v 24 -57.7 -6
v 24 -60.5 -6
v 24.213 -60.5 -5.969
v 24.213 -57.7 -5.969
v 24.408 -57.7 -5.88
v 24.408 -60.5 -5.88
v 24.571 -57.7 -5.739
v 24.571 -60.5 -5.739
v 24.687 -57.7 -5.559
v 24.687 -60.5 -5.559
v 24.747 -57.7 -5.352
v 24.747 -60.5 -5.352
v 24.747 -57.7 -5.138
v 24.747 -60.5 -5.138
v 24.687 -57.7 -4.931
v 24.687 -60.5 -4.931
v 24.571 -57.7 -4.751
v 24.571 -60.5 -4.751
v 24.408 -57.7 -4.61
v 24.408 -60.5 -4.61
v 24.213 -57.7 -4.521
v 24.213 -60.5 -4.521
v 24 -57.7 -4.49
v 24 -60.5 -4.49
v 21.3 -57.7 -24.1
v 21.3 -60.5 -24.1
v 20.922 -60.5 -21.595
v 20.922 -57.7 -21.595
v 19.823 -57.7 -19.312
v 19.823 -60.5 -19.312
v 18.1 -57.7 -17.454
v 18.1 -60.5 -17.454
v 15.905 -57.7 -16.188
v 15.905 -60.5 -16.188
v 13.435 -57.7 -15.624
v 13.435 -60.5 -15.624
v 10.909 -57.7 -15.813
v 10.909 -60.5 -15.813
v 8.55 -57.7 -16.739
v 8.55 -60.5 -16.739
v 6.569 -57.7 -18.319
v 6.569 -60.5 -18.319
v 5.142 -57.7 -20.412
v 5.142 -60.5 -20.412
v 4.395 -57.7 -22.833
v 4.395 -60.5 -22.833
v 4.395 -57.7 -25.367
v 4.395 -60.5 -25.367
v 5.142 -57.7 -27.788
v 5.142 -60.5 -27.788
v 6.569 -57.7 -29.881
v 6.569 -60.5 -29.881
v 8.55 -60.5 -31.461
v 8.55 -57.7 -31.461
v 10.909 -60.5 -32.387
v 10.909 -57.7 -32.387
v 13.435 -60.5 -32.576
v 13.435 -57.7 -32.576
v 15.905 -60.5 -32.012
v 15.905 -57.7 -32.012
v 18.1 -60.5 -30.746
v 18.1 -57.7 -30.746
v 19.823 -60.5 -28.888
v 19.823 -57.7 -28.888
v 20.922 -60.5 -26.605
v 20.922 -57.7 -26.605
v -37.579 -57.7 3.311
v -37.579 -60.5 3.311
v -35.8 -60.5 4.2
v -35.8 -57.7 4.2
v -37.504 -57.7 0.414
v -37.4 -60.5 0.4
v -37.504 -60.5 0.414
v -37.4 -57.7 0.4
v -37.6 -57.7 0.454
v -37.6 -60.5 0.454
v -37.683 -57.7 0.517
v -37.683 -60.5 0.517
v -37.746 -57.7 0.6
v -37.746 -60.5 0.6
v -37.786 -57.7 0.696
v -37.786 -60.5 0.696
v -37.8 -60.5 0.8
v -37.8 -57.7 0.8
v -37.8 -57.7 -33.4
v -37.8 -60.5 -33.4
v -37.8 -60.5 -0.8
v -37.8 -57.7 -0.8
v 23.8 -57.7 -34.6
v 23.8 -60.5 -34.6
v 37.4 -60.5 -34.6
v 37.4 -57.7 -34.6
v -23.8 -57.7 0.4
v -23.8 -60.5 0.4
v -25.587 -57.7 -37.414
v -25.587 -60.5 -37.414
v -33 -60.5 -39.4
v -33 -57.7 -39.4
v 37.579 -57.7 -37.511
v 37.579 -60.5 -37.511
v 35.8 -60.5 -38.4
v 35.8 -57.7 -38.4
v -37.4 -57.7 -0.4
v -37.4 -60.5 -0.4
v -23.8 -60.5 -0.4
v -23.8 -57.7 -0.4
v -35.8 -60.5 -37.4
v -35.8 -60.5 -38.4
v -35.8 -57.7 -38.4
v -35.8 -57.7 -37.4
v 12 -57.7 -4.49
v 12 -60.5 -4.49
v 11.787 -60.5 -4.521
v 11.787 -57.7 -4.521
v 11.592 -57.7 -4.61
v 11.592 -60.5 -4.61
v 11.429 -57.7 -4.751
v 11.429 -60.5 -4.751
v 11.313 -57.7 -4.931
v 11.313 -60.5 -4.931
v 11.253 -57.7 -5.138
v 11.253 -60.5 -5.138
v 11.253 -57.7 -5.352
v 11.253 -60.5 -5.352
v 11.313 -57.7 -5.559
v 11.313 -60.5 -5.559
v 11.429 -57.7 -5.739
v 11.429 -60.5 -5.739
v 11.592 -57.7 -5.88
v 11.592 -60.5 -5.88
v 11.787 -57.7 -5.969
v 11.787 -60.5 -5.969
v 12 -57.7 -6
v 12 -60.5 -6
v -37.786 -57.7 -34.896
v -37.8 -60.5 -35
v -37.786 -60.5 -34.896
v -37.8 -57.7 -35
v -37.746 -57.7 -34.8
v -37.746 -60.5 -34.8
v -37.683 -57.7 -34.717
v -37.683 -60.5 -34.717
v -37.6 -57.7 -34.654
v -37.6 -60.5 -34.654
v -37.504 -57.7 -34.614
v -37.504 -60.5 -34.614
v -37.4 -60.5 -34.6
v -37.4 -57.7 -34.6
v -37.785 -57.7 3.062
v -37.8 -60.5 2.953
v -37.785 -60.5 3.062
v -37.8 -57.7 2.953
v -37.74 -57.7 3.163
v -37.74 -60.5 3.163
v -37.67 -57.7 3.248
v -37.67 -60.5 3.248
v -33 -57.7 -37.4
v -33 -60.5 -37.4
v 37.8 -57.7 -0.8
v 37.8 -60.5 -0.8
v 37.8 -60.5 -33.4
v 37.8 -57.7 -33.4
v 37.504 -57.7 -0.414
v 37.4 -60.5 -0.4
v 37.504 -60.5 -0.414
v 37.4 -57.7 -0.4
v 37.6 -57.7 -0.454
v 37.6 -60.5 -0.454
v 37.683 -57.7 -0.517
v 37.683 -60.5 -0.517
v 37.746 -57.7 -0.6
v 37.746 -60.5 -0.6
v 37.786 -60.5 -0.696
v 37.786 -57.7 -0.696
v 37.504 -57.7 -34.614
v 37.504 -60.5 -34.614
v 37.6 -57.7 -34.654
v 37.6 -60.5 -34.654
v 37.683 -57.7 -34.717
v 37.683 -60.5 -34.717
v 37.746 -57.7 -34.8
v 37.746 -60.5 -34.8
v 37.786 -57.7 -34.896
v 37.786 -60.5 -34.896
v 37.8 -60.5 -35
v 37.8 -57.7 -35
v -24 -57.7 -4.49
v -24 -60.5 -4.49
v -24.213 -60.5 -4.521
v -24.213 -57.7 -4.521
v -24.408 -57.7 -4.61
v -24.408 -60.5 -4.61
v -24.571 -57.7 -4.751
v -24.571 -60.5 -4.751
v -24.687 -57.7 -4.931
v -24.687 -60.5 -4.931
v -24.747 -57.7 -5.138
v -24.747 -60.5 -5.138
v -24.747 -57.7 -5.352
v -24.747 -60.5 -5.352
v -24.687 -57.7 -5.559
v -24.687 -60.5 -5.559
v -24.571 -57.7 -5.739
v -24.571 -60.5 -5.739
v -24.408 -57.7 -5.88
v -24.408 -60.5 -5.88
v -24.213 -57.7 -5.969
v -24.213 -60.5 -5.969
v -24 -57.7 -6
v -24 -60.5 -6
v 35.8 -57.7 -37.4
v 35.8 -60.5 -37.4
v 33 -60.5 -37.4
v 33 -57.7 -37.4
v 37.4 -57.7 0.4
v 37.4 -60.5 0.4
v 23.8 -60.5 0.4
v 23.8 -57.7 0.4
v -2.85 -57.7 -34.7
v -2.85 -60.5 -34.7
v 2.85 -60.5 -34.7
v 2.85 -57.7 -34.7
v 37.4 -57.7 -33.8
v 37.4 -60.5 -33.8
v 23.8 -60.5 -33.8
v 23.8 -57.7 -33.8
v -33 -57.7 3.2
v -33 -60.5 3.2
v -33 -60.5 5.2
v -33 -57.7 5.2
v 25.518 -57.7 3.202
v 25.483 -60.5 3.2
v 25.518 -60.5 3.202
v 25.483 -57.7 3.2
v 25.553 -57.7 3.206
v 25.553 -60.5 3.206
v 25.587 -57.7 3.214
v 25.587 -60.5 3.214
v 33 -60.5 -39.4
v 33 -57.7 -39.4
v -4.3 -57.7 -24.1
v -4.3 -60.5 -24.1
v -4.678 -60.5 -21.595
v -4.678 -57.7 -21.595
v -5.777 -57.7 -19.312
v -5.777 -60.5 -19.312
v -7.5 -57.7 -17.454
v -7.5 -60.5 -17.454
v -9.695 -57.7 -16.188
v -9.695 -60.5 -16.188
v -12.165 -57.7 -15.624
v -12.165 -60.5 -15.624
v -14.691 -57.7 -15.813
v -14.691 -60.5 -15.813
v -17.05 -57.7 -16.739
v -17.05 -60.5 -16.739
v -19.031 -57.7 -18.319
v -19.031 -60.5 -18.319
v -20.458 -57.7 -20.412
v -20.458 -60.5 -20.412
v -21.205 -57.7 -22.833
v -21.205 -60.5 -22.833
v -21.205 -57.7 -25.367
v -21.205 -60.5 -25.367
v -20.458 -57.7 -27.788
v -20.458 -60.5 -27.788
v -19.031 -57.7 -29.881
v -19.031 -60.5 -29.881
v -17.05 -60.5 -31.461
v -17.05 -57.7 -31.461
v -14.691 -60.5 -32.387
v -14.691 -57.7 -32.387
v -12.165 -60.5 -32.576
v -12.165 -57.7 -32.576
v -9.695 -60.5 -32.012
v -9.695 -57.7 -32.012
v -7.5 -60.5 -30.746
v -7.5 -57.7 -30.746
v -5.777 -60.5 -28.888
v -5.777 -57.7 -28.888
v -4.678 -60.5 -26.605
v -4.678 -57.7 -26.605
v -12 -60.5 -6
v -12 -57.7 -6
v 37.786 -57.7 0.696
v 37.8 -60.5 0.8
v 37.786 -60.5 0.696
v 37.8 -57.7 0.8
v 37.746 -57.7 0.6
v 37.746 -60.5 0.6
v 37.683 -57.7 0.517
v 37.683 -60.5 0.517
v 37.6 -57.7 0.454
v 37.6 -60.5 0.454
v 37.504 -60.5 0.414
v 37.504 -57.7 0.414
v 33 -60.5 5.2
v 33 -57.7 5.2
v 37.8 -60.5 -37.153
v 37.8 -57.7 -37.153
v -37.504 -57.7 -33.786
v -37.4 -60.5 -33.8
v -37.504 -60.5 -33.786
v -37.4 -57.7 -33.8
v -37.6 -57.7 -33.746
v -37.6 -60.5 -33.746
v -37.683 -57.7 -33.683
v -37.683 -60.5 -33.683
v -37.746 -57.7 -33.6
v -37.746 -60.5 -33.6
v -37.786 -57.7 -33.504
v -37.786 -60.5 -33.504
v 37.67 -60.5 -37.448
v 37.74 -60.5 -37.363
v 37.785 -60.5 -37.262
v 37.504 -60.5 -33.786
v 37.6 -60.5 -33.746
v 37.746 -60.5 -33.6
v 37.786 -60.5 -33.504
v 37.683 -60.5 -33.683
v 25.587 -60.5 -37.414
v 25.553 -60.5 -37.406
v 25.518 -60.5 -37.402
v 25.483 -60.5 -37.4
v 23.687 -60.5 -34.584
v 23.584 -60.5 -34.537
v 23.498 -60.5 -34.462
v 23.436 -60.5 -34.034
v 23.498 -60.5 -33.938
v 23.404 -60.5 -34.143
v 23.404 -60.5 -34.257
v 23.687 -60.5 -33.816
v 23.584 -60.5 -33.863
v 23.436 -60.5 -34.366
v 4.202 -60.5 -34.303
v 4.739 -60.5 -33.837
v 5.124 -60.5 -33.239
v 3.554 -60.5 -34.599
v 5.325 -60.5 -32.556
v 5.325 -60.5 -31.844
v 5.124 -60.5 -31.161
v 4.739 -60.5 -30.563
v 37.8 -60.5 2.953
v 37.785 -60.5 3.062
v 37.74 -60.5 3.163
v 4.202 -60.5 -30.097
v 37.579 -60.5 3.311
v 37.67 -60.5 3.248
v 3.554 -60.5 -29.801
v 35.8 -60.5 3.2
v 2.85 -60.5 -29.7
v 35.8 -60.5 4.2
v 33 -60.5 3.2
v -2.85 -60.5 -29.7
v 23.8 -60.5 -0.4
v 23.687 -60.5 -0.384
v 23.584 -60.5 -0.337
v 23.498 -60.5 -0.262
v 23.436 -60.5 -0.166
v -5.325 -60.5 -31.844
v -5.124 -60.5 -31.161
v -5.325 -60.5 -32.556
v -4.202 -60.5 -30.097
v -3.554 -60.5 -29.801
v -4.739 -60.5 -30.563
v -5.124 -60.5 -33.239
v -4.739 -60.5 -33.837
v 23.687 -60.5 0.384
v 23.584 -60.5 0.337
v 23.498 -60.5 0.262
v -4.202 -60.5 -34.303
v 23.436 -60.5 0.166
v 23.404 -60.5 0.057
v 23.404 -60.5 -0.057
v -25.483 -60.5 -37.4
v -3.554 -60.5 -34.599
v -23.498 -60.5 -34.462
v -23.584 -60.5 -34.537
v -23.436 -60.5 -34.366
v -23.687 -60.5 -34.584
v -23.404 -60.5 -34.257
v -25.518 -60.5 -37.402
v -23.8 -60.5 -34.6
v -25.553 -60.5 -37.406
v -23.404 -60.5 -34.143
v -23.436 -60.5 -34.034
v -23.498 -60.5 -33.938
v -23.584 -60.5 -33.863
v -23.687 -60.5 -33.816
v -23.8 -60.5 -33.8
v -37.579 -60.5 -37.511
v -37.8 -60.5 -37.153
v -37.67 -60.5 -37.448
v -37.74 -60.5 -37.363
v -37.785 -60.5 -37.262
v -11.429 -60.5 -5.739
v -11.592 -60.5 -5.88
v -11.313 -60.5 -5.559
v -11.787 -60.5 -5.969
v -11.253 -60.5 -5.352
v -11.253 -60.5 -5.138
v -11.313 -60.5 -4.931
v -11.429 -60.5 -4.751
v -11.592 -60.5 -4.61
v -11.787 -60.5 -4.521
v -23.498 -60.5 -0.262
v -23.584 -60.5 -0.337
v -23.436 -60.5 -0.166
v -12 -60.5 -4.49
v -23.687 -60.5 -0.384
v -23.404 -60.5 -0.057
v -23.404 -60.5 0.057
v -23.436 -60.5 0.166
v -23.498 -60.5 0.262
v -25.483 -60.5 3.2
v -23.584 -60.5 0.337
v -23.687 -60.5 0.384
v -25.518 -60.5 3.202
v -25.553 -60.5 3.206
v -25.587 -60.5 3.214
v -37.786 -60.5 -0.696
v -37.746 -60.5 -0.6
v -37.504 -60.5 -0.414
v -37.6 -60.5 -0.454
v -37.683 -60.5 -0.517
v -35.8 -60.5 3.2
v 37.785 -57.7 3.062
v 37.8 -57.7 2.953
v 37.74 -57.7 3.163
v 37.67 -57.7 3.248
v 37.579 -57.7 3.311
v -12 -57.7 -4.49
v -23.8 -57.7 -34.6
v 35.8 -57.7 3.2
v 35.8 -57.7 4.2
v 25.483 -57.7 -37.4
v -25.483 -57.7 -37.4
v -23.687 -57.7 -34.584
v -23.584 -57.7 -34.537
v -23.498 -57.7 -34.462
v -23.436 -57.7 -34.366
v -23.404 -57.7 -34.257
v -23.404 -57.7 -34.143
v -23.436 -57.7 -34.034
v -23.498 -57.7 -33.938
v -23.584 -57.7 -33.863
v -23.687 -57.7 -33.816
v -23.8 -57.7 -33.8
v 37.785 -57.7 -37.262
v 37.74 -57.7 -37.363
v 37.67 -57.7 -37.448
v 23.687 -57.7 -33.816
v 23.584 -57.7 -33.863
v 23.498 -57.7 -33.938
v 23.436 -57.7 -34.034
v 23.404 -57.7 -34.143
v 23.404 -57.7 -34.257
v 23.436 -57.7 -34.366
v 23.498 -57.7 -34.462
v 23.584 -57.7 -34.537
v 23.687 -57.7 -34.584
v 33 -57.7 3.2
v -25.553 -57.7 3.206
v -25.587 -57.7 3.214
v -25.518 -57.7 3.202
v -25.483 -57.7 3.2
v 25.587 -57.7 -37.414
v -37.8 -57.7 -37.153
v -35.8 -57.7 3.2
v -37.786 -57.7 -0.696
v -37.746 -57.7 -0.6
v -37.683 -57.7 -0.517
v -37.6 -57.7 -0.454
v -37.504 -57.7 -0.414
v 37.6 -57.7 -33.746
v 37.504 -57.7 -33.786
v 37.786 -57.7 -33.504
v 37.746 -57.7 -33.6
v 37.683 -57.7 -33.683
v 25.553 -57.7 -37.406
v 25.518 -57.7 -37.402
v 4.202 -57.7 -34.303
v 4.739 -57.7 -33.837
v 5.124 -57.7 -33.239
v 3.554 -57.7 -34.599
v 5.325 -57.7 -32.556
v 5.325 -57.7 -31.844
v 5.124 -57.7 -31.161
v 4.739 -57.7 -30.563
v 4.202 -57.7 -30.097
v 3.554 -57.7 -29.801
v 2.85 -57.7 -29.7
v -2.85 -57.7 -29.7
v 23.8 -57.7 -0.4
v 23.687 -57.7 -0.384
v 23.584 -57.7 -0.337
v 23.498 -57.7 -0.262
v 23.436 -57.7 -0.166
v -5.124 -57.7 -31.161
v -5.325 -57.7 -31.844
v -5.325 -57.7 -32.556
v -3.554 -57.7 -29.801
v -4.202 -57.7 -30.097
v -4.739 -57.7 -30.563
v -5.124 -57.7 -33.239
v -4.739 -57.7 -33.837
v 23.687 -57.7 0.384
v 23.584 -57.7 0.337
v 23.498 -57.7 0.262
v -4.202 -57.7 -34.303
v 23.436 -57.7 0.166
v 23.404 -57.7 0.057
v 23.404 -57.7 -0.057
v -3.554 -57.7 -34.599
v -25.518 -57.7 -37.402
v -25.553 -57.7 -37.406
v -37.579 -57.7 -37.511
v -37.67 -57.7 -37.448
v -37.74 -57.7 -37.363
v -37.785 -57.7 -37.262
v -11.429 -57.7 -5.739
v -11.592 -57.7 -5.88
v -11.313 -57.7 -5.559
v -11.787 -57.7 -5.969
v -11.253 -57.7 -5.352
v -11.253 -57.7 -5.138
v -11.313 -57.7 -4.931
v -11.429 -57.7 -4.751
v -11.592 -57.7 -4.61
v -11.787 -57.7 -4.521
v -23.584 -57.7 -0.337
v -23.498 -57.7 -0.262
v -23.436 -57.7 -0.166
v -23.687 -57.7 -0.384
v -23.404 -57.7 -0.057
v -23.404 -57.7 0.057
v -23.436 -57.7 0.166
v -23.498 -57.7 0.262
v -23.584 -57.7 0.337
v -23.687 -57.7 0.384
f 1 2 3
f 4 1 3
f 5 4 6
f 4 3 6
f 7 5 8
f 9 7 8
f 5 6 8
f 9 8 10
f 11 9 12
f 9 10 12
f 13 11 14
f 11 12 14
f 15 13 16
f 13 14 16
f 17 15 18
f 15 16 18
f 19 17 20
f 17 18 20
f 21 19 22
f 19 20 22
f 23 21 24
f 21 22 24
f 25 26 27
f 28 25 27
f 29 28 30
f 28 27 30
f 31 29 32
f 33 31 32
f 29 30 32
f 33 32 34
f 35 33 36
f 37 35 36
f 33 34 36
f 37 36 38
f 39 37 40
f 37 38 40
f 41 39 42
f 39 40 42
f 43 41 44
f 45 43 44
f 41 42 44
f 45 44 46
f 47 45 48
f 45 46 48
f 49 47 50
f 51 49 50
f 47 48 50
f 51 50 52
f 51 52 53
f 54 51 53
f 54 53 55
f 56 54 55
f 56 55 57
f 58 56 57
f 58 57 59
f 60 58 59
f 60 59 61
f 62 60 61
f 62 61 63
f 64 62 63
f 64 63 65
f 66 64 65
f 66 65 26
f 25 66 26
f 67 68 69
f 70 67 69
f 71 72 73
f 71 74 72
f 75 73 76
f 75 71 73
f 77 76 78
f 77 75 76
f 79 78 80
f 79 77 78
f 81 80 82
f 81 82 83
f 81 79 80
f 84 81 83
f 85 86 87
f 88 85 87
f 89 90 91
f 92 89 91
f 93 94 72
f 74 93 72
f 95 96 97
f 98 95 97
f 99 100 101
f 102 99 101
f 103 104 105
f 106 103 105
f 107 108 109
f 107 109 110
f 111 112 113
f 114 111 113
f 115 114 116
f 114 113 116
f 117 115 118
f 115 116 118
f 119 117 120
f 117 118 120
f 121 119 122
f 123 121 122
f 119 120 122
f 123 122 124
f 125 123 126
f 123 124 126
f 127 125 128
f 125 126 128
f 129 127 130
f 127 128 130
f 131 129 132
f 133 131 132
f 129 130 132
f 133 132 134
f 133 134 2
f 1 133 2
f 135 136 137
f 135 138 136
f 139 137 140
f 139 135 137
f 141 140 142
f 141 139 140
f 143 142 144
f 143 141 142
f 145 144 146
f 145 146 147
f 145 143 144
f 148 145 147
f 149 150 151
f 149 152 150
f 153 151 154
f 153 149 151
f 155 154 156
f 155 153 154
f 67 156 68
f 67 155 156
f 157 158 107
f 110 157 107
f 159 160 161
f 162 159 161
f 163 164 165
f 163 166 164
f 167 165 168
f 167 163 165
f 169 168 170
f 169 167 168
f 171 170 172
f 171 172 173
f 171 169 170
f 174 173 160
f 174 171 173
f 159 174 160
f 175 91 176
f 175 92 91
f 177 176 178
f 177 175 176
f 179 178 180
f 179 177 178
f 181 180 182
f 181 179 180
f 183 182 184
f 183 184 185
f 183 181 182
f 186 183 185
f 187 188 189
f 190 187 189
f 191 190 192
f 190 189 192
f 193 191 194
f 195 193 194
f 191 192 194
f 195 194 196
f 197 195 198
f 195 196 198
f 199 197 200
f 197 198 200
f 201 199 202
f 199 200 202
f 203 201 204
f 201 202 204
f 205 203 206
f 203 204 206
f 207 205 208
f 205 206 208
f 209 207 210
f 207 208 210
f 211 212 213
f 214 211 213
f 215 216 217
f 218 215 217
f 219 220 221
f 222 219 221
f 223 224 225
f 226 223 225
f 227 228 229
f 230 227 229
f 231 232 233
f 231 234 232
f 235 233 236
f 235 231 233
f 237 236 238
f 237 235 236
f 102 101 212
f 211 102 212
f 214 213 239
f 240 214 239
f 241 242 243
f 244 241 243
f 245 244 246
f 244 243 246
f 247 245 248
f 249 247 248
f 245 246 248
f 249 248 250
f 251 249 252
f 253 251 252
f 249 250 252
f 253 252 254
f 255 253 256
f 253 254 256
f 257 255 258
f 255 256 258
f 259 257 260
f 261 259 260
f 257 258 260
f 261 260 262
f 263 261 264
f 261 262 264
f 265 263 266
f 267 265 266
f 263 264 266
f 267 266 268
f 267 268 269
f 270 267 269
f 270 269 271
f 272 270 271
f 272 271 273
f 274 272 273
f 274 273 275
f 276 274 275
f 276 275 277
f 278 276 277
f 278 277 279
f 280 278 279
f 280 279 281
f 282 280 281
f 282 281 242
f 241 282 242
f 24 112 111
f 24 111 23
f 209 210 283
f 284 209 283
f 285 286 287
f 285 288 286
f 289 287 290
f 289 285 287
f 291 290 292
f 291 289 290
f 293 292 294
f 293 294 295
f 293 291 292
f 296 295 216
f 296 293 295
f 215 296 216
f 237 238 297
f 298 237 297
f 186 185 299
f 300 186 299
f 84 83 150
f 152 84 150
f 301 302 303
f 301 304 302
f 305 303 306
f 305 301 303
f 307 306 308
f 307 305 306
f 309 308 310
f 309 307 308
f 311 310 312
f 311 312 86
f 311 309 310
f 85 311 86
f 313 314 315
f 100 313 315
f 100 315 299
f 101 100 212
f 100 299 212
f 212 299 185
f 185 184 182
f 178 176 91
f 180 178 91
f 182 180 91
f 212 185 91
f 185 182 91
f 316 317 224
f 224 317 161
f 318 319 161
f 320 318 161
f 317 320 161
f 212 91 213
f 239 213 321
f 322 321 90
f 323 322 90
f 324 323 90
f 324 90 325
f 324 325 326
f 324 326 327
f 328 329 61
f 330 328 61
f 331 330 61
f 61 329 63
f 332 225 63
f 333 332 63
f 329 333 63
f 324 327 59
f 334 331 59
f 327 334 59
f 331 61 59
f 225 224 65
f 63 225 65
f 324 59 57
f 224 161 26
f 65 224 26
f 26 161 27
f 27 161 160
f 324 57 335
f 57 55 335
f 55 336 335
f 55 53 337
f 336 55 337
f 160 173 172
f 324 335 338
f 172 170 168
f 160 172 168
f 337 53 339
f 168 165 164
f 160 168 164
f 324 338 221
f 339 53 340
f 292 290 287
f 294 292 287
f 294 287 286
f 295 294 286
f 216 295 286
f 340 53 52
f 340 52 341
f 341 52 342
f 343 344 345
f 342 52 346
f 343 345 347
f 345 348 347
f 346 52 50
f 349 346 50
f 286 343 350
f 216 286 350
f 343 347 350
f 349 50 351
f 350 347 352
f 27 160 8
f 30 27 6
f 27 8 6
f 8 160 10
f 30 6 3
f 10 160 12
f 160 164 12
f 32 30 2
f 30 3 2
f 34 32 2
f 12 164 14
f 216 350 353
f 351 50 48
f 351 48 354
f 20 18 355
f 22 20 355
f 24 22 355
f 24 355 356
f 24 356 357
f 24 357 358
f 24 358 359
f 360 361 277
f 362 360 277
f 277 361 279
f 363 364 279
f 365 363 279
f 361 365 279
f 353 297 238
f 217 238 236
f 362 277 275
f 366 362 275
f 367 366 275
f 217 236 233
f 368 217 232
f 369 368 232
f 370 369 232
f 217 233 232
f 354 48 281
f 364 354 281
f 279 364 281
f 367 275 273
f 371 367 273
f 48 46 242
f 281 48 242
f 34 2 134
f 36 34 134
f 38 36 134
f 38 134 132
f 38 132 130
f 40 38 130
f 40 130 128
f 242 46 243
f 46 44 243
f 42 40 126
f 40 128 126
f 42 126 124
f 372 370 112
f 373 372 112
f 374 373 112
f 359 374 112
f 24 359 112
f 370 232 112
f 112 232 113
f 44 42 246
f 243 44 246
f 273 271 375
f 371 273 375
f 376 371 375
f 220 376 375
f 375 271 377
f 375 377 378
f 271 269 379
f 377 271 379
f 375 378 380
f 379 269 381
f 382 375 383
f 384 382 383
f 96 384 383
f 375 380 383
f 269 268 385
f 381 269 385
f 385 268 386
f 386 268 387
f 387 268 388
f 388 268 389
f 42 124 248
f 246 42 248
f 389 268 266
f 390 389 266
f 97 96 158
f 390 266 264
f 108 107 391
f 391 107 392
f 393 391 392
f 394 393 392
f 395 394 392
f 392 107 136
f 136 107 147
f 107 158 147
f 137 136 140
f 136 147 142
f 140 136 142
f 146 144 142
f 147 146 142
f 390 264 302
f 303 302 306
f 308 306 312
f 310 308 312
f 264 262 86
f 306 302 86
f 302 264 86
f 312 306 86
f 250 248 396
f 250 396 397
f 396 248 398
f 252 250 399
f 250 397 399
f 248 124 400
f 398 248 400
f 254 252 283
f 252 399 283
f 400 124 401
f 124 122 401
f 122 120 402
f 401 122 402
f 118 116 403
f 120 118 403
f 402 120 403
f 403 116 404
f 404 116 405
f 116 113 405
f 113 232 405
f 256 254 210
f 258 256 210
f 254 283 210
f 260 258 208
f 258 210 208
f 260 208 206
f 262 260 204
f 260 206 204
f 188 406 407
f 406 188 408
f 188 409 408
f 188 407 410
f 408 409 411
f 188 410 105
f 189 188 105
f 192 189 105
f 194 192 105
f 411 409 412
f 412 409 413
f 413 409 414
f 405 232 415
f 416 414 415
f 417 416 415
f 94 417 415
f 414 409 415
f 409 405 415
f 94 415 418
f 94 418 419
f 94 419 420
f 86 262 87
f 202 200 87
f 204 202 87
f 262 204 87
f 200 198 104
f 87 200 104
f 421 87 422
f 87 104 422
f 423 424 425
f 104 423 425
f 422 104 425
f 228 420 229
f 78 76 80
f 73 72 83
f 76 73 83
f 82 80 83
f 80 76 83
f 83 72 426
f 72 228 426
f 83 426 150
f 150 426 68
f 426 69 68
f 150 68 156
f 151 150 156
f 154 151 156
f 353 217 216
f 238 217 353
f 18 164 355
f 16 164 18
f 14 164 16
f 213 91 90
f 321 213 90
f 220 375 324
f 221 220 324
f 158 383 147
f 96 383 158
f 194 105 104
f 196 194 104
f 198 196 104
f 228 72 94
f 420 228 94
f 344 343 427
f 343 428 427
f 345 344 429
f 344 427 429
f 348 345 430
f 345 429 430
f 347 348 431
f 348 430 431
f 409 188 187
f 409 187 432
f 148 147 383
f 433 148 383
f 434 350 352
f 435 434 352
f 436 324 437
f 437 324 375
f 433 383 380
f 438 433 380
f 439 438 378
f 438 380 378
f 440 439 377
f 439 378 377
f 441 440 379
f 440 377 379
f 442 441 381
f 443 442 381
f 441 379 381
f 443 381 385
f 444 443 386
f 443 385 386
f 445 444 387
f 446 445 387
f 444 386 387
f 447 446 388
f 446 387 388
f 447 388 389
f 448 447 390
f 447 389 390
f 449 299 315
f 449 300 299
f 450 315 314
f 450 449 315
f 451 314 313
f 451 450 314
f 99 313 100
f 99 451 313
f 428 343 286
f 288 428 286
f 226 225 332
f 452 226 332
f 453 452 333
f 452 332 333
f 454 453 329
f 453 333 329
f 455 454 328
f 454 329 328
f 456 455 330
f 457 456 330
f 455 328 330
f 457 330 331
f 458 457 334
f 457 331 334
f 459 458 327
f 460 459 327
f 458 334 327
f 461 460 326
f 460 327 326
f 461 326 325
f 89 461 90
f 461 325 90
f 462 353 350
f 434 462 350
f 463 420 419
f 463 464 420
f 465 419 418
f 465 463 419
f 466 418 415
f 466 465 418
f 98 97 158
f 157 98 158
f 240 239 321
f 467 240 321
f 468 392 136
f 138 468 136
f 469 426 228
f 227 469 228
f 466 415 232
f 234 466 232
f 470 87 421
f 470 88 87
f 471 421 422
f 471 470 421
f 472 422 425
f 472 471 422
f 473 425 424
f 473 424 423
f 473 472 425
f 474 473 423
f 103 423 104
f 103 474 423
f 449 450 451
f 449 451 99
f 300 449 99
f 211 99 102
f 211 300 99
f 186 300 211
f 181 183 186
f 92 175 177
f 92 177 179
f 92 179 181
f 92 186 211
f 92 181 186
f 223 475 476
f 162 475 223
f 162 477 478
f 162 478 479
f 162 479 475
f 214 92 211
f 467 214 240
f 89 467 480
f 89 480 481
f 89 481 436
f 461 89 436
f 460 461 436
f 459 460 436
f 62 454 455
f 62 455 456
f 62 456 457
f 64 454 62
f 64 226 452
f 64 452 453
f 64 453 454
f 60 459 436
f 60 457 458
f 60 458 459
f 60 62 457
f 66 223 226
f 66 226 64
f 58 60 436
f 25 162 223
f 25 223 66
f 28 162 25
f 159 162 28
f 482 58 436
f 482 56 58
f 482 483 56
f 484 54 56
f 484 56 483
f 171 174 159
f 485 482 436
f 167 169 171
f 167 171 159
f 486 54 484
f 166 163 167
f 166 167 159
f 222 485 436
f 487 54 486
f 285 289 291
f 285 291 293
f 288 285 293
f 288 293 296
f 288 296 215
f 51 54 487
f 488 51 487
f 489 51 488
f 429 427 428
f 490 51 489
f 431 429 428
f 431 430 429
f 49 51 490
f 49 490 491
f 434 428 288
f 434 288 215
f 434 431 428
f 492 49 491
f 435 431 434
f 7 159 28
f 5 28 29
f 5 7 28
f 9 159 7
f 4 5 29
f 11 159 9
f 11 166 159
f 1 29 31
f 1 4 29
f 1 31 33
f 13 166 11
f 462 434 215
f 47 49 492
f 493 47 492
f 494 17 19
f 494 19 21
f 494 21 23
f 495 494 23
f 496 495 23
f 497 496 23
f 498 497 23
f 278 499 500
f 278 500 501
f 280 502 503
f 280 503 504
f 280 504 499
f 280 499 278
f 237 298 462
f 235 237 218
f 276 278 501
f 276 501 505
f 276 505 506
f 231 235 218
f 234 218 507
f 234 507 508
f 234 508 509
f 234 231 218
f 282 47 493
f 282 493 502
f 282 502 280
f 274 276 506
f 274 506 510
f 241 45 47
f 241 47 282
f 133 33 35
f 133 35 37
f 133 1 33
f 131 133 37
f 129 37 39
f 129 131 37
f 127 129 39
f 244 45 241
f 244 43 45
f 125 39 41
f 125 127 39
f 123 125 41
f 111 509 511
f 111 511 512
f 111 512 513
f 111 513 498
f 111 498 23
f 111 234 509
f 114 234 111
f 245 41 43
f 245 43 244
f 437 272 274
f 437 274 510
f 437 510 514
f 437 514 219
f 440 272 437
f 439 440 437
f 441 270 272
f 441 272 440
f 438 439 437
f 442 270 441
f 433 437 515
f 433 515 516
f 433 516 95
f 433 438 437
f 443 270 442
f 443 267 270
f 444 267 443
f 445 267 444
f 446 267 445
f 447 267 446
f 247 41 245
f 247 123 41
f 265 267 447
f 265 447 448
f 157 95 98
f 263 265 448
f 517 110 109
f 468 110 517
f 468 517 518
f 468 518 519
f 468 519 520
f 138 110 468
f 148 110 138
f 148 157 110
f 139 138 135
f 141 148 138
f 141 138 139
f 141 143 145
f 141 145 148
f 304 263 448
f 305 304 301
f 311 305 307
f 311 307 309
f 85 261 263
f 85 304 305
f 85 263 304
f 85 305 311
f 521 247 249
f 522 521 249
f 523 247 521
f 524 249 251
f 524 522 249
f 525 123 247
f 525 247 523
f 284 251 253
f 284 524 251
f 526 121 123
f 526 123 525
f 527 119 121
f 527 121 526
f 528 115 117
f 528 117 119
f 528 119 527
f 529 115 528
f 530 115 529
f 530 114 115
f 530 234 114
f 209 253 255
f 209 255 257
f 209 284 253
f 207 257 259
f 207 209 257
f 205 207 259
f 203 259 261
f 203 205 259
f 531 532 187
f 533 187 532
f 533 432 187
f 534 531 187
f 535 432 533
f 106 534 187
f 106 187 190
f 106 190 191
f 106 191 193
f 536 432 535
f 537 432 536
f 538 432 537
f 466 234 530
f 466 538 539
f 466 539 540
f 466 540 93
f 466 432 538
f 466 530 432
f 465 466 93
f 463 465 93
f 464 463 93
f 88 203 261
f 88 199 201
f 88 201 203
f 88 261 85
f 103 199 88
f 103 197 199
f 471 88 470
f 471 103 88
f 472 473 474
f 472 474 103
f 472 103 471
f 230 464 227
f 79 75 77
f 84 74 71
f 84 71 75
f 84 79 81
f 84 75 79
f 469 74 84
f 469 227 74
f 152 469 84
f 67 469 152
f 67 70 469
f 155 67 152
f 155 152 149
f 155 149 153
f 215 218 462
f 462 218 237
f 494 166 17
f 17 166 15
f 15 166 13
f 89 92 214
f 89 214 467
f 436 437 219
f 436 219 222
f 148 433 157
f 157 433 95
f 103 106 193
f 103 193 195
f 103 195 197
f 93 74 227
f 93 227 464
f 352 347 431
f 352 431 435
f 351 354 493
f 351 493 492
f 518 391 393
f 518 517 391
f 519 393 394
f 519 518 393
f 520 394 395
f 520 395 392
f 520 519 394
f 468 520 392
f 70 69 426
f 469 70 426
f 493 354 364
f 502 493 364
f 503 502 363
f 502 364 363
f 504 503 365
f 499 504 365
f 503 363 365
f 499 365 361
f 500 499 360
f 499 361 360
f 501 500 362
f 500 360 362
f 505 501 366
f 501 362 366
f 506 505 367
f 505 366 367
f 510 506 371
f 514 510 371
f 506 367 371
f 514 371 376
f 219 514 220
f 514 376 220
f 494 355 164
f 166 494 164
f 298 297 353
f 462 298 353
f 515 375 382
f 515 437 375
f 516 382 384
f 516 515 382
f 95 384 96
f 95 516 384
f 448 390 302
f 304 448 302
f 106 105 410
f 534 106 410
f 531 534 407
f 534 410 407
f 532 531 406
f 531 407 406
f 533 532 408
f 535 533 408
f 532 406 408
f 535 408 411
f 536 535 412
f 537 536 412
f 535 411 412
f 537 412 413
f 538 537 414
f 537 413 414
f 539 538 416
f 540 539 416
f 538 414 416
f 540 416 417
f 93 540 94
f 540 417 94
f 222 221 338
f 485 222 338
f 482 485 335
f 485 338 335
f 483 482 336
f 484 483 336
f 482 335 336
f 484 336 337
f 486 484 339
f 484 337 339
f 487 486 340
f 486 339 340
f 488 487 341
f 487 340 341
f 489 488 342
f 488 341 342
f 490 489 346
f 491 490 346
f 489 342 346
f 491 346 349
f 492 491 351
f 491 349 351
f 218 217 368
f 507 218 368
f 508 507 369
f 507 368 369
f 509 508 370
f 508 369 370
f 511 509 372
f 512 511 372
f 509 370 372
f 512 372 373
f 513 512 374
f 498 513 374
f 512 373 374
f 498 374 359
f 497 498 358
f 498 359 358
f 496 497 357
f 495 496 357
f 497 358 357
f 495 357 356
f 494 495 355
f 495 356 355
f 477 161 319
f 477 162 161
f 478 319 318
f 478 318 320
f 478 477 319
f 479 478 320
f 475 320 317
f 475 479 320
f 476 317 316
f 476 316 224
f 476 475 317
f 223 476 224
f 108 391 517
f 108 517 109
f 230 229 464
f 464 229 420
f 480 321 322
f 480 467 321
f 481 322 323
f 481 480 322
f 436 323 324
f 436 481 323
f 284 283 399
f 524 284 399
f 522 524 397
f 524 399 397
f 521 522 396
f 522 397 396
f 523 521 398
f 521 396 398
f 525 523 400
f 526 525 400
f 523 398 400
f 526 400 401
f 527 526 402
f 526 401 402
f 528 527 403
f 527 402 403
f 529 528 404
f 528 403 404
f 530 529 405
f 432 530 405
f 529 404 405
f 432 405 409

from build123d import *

# Parameters (mm, degrees)
PAD009_DEPTH    = 2.8
FILLET004_R     = 0.4
POCKET014_DEPTH = 2.801
SKETCH028_R     = 8.5
POCKET017_DEPTH = 2.801


with BuildPart() as part:
    # Sketch009 → Pad009 (new body)
    with BuildSketch(Plane.XZ.offset(60.5)):
        with BuildLine():
            Line((37.8, 3.2), (37.8, 0.4))
            Line((37.8, 0.4), (23.8, 0.4))
            ThreePointArc((23.8, 0.4), (23.4, 0), (23.8, -0.4))
            Line((23.8, -0.4), (37.8, -0.4))
            Line((37.8, -0.4), (37.8, -33.8))
            Line((37.8, -33.8), (23.8, -33.8))
            ThreePointArc((23.8, -33.8), (23.4, -34.2), (23.8, -34.6))
            Line((23.8, -34.6), (37.8, -34.6))
            Line((37.8, -34.6), (37.8, -37.4))
            Line((37.8, -37.4), (35.8, -38.4))
            Line((35.8, -38.4), (35.8, -37.4))
            Line((35.8, -37.4), (33, -37.4))
            Line((33, -37.4), (33, -39.4))
            Line((33, -39.4), (25.535898, -37.4))
            Line((25.535898, -37.4), (-25.535898, -37.4))
            Line((-25.535898, -37.4), (-33, -39.4))
            Line((-33, -39.4), (-33, -37.4))
            Line((-33, -37.4), (-35.8, -37.4))
            Line((-35.8, -38.4), (-35.8, -37.4))
            Line((-37.8, -37.4), (-35.8, -38.4))
            Line((-37.8, -37.4), (-37.8, -34.6))
            Line((-37.8, -34.6), (-23.8, -34.6))
            ThreePointArc((-23.8, -34.6), (-23.4, -34.2), (-23.8, -33.8))
            Line((-23.8, -33.8), (-37.8, -33.8))
            Line((-37.8, -33.8), (-37.8, -0.4))
            Line((-37.8, -0.4), (-23.8, -0.4))
            ThreePointArc((-23.8, -0.4), (-23.4, 0), (-23.8, 0.4))
            Line((-23.8, 0.4), (-37.8, 0.4))
            Line((-37.8, 0.4), (-37.8, 3.2))
            Line((-37.8, 3.2), (-35.8, 4.2))
            Line((-35.8, 4.2), (-35.8, 3.2))
            Line((-35.8, 3.2), (-33, 3.2))
            Line((-33, 3.2), (-33, 5.2))
            Line((-33, 5.2), (-25.535898, 3.2))
            Line((-25.535898, 3.2), (25.535898, 3.2))
            Line((25.535898, 3.2), (33, 5.2))
            Line((33, 5.2), (33, 3.2))
            Line((33, 3.2), (35.8, 3.2))
            Line((35.8, 3.2), (35.8, 4.2))
            Line((37.8, 3.2), (35.8, 4.2))
        make_face()
    extrude(amount=-PAD009_DEPTH)

    # Fillet004
    fillet004_edges = [part.edges().sort_by_distance(p)[0] for p in [
        (37.8, -59.1, -0.4),
        (37.8, -59.1, 0.4),
        (37.8, -59.1, 3.2),
        (25.535898, -59.1, 3.2),
        (-25.535898, -59.1, 3.2),
        (-37.8, -59.1, 3.2),
        (-37.8, -59.1, 0.4),
        (-37.8, -59.1, -0.4),
        (-37.8, -59.1, -33.8),
        (-37.8, -59.1, -34.6),
        (-37.8, -59.1, -37.4),
        (-25.535898, -59.1, -37.4),
        (25.535898, -59.1, -37.4),
        (37.8, -59.1, -37.4),
        (37.8, -59.1, -34.6),
        (37.8, -59.1, -33.8),
    ]]
    fillet(fillet004_edges, radius=FILLET004_R)

    # Sketch025 → Pocket014 (cut, through all)
    with BuildSketch(Plane.XZ.offset(60.5)):
        with BuildLine():
            ThreePointArc((-24, -4.49), (-24.755, -5.245), (-24, -6))
            Line((-24, -6), (-12, -6))
            ThreePointArc((-12, -6), (-11.245, -5.245), (-12, -4.49))
            Line((-24, -4.49), (-12, -4.49))
        make_face()
        with BuildLine():
            ThreePointArc((12, -4.49), (11.245, -5.245), (12, -6))
            Line((12, -6), (24, -6))
            ThreePointArc((24, -6), (24.755, -5.245), (24, -4.49))
            Line((12, -4.49), (24, -4.49))
        make_face()
    extrude(amount=-POCKET014_DEPTH, mode=Mode.SUBTRACT)

    # Sketch028 → Pocket017 (cut, through all)
    with BuildSketch(Plane.XZ.offset(60.5)):
        with Locations((-12.8, -24.1)):
            Circle(SKETCH028_R)
        with Locations((12.8, -24.1)):
            Circle(SKETCH028_R)
        with BuildLine():
            ThreePointArc((-2.85, -29.7), (-5.35, -32.2), (-2.85, -34.7))
            Line((-2.85, -34.7), (2.85, -34.7))
            ThreePointArc((2.85, -34.7), (5.35, -32.2), (2.85, -29.7))
            Line((-2.85, -29.7), (2.85, -29.7))
        make_face()
    extrude(amount=-POCKET017_DEPTH, mode=Mode.SUBTRACT)


solid = part.part
